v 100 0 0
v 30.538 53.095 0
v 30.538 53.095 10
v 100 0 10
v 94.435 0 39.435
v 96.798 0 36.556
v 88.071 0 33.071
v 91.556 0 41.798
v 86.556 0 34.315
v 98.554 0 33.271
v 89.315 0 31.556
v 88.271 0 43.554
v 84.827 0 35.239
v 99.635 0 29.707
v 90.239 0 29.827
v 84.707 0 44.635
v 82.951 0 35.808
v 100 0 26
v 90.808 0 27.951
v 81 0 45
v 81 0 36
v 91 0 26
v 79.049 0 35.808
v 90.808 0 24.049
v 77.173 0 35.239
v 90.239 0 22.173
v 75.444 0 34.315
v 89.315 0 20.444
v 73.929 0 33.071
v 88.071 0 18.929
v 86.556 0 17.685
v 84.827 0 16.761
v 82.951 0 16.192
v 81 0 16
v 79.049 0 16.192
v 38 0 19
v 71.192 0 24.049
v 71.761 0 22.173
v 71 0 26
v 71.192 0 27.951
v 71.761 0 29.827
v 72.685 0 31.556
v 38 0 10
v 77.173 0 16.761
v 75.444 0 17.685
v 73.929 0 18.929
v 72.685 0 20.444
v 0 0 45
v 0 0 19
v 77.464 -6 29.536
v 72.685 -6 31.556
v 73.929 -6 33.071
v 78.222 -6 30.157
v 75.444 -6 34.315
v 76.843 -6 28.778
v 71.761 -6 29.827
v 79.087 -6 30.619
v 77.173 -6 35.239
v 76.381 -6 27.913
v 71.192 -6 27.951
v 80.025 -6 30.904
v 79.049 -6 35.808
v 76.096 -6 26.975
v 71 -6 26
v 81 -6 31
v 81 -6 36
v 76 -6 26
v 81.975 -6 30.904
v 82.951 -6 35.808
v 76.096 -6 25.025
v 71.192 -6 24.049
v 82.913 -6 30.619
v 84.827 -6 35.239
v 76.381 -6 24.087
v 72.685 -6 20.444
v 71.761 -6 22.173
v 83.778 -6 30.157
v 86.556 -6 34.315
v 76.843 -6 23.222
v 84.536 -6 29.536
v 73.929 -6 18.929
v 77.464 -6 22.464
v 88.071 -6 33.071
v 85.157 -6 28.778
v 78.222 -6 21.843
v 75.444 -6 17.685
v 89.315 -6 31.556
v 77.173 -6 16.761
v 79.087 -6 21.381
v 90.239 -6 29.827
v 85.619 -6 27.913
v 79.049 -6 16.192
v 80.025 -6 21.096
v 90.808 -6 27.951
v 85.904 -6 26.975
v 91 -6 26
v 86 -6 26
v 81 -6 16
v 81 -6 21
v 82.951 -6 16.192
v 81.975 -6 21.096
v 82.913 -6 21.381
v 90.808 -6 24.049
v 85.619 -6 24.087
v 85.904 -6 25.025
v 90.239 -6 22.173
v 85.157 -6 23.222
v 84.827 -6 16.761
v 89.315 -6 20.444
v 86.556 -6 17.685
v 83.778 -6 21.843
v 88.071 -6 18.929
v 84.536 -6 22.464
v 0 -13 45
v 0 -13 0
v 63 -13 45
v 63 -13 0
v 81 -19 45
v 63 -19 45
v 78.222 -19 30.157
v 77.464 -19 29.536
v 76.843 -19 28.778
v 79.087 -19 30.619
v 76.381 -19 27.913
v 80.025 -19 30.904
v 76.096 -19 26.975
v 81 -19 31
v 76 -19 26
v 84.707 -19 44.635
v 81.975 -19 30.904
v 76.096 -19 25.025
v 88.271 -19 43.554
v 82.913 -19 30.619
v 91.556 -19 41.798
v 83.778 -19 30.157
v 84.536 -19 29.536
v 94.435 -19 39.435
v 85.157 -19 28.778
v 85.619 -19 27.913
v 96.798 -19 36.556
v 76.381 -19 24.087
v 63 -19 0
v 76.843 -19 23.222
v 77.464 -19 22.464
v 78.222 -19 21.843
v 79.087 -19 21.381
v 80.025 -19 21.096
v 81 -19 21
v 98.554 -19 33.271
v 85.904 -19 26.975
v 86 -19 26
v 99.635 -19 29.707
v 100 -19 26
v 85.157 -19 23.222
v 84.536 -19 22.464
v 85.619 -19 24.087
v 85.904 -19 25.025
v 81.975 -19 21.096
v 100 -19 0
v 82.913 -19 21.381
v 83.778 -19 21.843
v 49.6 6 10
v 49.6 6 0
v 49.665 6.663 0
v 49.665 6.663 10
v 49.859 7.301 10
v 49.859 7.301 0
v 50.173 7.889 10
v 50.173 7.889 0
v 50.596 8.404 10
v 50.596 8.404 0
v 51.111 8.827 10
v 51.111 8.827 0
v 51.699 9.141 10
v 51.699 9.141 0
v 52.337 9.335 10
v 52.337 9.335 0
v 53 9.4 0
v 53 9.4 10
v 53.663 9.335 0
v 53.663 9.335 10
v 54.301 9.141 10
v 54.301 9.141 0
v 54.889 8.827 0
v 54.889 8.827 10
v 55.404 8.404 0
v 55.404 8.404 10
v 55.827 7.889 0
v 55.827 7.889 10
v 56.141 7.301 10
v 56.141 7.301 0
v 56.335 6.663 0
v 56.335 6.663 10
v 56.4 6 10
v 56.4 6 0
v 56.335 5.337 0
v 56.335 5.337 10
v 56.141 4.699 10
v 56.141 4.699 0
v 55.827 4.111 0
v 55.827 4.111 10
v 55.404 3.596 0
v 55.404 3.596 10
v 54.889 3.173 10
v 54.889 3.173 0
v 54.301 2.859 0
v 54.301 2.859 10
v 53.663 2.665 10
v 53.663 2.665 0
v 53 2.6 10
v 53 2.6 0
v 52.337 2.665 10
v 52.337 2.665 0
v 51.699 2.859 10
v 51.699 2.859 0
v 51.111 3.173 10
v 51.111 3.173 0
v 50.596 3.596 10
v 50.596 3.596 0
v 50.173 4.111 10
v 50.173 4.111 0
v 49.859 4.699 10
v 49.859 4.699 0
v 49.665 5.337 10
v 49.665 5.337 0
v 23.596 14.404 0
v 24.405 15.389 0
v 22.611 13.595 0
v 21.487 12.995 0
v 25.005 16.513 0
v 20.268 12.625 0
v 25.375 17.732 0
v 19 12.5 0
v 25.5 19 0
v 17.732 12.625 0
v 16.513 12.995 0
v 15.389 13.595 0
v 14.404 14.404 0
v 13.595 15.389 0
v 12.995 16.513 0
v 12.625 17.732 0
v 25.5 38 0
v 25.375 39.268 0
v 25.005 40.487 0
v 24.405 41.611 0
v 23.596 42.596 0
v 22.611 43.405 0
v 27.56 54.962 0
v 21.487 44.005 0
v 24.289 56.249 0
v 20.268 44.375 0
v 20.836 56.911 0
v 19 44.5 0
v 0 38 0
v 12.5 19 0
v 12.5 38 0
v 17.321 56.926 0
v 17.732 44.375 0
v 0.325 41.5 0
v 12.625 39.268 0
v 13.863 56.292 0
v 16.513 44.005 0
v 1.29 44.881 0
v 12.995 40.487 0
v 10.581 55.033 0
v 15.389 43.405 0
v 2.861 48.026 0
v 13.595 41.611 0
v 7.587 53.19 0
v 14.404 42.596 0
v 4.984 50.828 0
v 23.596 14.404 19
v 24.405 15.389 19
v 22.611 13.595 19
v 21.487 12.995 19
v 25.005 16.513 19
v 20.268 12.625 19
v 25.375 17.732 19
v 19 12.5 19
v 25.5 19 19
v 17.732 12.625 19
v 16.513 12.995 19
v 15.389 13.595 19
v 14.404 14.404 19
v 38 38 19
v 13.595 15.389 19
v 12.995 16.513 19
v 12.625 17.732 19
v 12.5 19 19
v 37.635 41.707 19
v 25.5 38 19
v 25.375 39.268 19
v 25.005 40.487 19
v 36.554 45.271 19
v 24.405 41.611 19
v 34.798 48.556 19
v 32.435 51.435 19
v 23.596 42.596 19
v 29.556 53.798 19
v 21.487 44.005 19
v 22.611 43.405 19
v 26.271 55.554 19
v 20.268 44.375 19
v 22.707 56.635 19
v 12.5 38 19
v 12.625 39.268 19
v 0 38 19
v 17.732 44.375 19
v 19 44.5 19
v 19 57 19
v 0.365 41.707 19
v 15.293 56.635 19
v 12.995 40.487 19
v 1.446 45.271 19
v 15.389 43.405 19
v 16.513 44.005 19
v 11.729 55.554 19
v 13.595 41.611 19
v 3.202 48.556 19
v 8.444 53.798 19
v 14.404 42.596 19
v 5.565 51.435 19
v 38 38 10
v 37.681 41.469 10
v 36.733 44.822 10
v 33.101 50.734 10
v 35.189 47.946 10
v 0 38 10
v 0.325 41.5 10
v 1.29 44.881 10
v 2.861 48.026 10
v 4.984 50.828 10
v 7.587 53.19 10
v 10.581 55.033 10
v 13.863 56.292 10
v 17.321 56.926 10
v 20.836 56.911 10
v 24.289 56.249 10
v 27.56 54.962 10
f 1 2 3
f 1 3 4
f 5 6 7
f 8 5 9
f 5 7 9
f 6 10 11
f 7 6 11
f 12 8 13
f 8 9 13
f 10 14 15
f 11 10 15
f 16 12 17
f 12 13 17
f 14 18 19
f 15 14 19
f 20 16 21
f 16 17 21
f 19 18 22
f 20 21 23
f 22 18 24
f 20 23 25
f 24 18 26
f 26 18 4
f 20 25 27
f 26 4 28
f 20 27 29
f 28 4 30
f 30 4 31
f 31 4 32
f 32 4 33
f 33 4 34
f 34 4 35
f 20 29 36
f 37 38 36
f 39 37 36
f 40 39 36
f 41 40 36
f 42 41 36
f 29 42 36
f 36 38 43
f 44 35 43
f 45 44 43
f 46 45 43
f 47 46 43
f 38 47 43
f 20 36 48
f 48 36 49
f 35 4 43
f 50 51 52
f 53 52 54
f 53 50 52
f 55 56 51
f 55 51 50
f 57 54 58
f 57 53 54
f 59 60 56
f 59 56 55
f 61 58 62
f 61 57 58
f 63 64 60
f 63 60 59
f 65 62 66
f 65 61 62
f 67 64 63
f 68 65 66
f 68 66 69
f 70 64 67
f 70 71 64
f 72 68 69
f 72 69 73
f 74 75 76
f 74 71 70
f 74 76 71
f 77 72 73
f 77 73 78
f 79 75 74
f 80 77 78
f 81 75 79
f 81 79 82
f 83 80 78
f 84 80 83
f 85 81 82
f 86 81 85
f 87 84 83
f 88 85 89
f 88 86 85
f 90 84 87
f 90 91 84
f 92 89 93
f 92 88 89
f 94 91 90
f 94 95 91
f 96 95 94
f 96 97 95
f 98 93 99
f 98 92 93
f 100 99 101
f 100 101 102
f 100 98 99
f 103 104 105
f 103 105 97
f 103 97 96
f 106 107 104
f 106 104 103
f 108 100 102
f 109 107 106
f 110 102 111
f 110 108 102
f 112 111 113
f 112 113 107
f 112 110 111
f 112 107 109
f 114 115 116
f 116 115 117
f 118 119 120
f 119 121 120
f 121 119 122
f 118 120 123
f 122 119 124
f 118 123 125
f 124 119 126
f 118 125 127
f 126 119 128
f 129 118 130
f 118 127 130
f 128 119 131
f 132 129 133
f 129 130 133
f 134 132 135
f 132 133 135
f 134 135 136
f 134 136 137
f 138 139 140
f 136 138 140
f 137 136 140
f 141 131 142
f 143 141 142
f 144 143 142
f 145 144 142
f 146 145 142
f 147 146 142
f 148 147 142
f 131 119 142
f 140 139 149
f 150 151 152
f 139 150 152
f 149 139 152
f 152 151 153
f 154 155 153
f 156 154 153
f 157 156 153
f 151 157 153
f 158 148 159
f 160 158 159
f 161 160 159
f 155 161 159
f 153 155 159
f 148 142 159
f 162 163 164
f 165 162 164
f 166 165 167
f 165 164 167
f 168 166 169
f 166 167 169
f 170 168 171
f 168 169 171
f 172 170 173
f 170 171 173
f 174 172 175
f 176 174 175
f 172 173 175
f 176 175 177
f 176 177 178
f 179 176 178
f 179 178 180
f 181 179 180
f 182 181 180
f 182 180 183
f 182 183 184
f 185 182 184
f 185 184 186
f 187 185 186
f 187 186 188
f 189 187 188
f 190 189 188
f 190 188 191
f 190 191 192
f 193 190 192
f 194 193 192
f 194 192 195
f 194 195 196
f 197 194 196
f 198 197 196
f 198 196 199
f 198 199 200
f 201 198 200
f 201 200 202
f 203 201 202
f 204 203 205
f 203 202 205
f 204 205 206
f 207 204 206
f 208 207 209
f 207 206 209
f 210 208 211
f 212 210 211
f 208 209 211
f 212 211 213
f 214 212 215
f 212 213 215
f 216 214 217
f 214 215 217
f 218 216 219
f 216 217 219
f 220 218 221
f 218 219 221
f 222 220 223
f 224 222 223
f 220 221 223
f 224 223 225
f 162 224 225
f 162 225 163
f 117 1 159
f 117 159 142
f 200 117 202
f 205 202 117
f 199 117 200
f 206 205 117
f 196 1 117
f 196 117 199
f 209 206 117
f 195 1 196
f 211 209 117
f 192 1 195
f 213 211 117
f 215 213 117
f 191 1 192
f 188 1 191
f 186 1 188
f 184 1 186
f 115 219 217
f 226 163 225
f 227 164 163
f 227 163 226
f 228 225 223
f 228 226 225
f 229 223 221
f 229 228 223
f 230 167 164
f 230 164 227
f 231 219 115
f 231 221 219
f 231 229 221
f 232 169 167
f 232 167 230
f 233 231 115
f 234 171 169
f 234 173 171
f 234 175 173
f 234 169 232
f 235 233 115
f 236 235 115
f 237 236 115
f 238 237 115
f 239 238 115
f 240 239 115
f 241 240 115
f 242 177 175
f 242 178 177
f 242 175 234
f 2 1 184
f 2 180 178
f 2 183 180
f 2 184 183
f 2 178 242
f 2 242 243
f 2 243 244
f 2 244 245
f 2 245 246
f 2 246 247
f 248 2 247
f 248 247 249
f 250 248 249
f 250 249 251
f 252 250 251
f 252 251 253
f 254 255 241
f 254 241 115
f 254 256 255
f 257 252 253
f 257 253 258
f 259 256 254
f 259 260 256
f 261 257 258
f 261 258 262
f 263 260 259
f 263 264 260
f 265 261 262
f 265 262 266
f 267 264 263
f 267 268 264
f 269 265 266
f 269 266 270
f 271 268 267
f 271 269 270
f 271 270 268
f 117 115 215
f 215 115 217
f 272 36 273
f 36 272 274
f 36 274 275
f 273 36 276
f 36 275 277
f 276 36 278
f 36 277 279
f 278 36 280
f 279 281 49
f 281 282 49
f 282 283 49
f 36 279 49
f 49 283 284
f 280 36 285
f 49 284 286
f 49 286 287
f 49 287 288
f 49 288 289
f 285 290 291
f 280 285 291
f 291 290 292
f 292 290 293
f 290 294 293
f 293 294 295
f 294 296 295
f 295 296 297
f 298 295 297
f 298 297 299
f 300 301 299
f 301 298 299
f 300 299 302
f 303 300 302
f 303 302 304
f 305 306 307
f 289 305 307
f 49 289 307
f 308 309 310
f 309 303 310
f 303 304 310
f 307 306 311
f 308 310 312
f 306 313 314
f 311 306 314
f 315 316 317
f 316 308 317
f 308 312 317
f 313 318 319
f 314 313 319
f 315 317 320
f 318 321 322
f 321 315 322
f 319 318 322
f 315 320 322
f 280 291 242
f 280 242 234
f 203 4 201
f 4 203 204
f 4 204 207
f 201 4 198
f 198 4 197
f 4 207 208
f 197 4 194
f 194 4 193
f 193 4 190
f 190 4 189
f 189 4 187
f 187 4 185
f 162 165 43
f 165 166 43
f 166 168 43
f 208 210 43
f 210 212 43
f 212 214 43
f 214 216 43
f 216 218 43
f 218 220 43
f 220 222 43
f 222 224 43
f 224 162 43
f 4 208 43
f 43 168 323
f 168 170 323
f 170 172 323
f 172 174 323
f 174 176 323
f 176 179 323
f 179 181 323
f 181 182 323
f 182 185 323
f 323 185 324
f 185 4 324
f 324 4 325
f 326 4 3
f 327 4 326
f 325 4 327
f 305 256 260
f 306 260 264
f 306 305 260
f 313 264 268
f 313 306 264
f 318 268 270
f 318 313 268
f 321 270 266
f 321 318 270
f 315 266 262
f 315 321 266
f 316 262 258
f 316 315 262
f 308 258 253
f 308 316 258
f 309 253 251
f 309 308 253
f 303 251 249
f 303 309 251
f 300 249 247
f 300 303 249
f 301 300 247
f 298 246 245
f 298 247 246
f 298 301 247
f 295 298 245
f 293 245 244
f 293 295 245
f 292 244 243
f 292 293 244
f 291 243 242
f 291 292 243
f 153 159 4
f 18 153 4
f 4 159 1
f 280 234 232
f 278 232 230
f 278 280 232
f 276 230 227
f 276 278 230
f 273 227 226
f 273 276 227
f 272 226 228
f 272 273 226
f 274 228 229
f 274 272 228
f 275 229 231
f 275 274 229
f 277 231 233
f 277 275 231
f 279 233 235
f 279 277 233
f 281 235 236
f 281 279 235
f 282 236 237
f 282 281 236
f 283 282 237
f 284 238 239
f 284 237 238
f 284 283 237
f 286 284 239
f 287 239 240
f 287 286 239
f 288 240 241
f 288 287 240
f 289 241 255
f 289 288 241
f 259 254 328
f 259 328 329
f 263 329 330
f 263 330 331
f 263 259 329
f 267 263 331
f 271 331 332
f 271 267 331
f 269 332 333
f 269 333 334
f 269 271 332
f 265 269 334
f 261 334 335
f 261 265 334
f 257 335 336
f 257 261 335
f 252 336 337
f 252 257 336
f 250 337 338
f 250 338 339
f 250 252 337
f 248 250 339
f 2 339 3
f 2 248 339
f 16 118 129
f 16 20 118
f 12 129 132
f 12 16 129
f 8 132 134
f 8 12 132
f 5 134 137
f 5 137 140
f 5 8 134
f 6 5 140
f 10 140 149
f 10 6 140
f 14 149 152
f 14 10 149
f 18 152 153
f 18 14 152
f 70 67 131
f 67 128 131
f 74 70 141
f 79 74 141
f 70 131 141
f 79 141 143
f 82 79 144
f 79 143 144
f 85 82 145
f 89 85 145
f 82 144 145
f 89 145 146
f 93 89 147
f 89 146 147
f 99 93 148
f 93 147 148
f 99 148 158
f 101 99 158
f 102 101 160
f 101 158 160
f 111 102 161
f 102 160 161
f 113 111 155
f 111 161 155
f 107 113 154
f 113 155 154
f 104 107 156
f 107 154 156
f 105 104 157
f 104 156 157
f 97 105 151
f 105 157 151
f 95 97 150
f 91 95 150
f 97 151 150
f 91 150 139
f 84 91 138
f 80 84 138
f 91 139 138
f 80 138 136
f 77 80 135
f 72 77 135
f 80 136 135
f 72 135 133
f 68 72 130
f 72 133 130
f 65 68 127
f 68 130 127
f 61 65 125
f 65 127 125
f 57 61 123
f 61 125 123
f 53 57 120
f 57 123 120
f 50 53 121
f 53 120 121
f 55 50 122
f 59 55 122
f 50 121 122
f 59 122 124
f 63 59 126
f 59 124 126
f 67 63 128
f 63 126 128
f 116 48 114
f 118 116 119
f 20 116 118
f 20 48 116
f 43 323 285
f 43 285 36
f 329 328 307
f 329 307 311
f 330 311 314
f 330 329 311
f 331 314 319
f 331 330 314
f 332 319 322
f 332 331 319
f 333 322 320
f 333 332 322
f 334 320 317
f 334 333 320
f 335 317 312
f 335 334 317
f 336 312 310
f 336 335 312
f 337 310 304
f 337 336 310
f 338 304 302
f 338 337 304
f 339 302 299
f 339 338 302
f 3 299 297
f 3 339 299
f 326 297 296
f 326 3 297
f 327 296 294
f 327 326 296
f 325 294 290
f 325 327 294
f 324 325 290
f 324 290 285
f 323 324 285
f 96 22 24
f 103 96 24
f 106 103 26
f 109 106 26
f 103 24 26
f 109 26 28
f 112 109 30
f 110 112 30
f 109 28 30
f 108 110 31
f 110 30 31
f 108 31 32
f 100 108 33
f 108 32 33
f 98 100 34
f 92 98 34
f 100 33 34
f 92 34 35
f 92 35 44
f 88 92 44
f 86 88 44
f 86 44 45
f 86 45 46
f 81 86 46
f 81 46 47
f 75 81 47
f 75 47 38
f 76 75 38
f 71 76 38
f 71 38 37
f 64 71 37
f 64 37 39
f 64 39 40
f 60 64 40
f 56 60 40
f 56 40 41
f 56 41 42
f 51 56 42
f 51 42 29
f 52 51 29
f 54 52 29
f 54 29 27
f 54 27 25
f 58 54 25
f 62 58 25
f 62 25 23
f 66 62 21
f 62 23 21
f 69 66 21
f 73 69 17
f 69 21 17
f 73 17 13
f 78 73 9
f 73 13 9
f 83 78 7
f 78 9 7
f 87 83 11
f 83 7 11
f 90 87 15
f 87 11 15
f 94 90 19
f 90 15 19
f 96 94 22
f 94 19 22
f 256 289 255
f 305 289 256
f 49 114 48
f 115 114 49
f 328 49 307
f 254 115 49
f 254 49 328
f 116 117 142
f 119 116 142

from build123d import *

# Parameters (mm, degrees)
BOSS_EXTRUDE1_DEPTH = 45
BOSS_EXTRUDE2_DEPTH = 10
BOSS_EXTRUDE3_DEPTH = 9
CUT_EXTRUDE1_DEPTH  = 119.004237212
FILLET1_R           = 19
HOLE1_D             = 10
HOLE1_CBORE_D       = 20
HOLE1_CBORE_DEPTH   = 6
M8_TAPPED_HOLE2_D   = 6.8


with BuildPart() as part:
    # Sketch1 → Boss-Extrude1 (new body)
    with BuildSketch(Plane.XY):
        Polygon((0, 0), (0, -13), (63, -13), (63, -19), (100, -19), (100, 0), align=None)
    extrude(amount=BOSS_EXTRUDE1_DEPTH)

    # Sketch2 → Boss-Extrude2 (add)
    with BuildSketch(Plane(origin=(0, 0, 0), x_dir=(-1, 0, 0), z_dir=(0, 0, -1))):
        with BuildLine():
            Line((0, 0), (0, 38))
            ThreePointArc((0, 38), (-10.580703715, 55.032775759), (-30.538468428, 53.095156386))
            Line((-30.538468428, 53.095156386), (-100, 0))
            Line((-100, 0), (0, 0))
        make_face()
    extrude(amount=-BOSS_EXTRUDE2_DEPTH)

    # Sketch4 → Boss-Extrude3 (add)
    with BuildSketch(Plane.XY.offset(10)):
        with BuildLine():
            Line((0, 0), (0, 38))
            ThreePointArc((0, 38), (19, 57), (38, 38))
            Line((38, 38), (38, 0))
            Line((38, 0), (0, 0))
        make_face()
    extrude(amount=BOSS_EXTRUDE3_DEPTH)

    # Sketch5 → Cut-Extrude1 (cut, through all)
    with BuildSketch(Plane.XY.offset(19)):
        with BuildLine():
            Line((25.5, 38), (25.5, 19))
            ThreePointArc((25.5, 19), (19, 12.5), (12.5, 19))
            Line((12.5, 19), (12.5, 38))
            ThreePointArc((12.5, 38), (19, 44.5), (25.5, 38))
        make_face()
    extrude(amount=-CUT_EXTRUDE1_DEPTH, mode=Mode.SUBTRACT)

    # Fillet1
    fillet1_edges = [part.edges().sort_by_distance(p)[0] for p in [
        (100, -9.5, 45),
    ]]
    fillet(fillet1_edges, radius=FILLET1_R)

    # Hole1 (through all)
    with Locations(Plane(origin=(81, 0, 26), x_dir=(1, 0, 0), z_dir=(0, 1, 0))):
        with Locations((0, 0)):
            CounterBoreHole(HOLE1_D / 2, HOLE1_CBORE_D / 2, HOLE1_CBORE_DEPTH)

    # M8 Tapped Hole2 (through all)
    with Locations(Plane(origin=(53, 6, 10), x_dir=(1, 0, 0), z_dir=(0, 0, 1))):
        with Locations((0, 0)):
            Hole(M8_TAPPED_HOLE2_D / 2)


solid = part.part
